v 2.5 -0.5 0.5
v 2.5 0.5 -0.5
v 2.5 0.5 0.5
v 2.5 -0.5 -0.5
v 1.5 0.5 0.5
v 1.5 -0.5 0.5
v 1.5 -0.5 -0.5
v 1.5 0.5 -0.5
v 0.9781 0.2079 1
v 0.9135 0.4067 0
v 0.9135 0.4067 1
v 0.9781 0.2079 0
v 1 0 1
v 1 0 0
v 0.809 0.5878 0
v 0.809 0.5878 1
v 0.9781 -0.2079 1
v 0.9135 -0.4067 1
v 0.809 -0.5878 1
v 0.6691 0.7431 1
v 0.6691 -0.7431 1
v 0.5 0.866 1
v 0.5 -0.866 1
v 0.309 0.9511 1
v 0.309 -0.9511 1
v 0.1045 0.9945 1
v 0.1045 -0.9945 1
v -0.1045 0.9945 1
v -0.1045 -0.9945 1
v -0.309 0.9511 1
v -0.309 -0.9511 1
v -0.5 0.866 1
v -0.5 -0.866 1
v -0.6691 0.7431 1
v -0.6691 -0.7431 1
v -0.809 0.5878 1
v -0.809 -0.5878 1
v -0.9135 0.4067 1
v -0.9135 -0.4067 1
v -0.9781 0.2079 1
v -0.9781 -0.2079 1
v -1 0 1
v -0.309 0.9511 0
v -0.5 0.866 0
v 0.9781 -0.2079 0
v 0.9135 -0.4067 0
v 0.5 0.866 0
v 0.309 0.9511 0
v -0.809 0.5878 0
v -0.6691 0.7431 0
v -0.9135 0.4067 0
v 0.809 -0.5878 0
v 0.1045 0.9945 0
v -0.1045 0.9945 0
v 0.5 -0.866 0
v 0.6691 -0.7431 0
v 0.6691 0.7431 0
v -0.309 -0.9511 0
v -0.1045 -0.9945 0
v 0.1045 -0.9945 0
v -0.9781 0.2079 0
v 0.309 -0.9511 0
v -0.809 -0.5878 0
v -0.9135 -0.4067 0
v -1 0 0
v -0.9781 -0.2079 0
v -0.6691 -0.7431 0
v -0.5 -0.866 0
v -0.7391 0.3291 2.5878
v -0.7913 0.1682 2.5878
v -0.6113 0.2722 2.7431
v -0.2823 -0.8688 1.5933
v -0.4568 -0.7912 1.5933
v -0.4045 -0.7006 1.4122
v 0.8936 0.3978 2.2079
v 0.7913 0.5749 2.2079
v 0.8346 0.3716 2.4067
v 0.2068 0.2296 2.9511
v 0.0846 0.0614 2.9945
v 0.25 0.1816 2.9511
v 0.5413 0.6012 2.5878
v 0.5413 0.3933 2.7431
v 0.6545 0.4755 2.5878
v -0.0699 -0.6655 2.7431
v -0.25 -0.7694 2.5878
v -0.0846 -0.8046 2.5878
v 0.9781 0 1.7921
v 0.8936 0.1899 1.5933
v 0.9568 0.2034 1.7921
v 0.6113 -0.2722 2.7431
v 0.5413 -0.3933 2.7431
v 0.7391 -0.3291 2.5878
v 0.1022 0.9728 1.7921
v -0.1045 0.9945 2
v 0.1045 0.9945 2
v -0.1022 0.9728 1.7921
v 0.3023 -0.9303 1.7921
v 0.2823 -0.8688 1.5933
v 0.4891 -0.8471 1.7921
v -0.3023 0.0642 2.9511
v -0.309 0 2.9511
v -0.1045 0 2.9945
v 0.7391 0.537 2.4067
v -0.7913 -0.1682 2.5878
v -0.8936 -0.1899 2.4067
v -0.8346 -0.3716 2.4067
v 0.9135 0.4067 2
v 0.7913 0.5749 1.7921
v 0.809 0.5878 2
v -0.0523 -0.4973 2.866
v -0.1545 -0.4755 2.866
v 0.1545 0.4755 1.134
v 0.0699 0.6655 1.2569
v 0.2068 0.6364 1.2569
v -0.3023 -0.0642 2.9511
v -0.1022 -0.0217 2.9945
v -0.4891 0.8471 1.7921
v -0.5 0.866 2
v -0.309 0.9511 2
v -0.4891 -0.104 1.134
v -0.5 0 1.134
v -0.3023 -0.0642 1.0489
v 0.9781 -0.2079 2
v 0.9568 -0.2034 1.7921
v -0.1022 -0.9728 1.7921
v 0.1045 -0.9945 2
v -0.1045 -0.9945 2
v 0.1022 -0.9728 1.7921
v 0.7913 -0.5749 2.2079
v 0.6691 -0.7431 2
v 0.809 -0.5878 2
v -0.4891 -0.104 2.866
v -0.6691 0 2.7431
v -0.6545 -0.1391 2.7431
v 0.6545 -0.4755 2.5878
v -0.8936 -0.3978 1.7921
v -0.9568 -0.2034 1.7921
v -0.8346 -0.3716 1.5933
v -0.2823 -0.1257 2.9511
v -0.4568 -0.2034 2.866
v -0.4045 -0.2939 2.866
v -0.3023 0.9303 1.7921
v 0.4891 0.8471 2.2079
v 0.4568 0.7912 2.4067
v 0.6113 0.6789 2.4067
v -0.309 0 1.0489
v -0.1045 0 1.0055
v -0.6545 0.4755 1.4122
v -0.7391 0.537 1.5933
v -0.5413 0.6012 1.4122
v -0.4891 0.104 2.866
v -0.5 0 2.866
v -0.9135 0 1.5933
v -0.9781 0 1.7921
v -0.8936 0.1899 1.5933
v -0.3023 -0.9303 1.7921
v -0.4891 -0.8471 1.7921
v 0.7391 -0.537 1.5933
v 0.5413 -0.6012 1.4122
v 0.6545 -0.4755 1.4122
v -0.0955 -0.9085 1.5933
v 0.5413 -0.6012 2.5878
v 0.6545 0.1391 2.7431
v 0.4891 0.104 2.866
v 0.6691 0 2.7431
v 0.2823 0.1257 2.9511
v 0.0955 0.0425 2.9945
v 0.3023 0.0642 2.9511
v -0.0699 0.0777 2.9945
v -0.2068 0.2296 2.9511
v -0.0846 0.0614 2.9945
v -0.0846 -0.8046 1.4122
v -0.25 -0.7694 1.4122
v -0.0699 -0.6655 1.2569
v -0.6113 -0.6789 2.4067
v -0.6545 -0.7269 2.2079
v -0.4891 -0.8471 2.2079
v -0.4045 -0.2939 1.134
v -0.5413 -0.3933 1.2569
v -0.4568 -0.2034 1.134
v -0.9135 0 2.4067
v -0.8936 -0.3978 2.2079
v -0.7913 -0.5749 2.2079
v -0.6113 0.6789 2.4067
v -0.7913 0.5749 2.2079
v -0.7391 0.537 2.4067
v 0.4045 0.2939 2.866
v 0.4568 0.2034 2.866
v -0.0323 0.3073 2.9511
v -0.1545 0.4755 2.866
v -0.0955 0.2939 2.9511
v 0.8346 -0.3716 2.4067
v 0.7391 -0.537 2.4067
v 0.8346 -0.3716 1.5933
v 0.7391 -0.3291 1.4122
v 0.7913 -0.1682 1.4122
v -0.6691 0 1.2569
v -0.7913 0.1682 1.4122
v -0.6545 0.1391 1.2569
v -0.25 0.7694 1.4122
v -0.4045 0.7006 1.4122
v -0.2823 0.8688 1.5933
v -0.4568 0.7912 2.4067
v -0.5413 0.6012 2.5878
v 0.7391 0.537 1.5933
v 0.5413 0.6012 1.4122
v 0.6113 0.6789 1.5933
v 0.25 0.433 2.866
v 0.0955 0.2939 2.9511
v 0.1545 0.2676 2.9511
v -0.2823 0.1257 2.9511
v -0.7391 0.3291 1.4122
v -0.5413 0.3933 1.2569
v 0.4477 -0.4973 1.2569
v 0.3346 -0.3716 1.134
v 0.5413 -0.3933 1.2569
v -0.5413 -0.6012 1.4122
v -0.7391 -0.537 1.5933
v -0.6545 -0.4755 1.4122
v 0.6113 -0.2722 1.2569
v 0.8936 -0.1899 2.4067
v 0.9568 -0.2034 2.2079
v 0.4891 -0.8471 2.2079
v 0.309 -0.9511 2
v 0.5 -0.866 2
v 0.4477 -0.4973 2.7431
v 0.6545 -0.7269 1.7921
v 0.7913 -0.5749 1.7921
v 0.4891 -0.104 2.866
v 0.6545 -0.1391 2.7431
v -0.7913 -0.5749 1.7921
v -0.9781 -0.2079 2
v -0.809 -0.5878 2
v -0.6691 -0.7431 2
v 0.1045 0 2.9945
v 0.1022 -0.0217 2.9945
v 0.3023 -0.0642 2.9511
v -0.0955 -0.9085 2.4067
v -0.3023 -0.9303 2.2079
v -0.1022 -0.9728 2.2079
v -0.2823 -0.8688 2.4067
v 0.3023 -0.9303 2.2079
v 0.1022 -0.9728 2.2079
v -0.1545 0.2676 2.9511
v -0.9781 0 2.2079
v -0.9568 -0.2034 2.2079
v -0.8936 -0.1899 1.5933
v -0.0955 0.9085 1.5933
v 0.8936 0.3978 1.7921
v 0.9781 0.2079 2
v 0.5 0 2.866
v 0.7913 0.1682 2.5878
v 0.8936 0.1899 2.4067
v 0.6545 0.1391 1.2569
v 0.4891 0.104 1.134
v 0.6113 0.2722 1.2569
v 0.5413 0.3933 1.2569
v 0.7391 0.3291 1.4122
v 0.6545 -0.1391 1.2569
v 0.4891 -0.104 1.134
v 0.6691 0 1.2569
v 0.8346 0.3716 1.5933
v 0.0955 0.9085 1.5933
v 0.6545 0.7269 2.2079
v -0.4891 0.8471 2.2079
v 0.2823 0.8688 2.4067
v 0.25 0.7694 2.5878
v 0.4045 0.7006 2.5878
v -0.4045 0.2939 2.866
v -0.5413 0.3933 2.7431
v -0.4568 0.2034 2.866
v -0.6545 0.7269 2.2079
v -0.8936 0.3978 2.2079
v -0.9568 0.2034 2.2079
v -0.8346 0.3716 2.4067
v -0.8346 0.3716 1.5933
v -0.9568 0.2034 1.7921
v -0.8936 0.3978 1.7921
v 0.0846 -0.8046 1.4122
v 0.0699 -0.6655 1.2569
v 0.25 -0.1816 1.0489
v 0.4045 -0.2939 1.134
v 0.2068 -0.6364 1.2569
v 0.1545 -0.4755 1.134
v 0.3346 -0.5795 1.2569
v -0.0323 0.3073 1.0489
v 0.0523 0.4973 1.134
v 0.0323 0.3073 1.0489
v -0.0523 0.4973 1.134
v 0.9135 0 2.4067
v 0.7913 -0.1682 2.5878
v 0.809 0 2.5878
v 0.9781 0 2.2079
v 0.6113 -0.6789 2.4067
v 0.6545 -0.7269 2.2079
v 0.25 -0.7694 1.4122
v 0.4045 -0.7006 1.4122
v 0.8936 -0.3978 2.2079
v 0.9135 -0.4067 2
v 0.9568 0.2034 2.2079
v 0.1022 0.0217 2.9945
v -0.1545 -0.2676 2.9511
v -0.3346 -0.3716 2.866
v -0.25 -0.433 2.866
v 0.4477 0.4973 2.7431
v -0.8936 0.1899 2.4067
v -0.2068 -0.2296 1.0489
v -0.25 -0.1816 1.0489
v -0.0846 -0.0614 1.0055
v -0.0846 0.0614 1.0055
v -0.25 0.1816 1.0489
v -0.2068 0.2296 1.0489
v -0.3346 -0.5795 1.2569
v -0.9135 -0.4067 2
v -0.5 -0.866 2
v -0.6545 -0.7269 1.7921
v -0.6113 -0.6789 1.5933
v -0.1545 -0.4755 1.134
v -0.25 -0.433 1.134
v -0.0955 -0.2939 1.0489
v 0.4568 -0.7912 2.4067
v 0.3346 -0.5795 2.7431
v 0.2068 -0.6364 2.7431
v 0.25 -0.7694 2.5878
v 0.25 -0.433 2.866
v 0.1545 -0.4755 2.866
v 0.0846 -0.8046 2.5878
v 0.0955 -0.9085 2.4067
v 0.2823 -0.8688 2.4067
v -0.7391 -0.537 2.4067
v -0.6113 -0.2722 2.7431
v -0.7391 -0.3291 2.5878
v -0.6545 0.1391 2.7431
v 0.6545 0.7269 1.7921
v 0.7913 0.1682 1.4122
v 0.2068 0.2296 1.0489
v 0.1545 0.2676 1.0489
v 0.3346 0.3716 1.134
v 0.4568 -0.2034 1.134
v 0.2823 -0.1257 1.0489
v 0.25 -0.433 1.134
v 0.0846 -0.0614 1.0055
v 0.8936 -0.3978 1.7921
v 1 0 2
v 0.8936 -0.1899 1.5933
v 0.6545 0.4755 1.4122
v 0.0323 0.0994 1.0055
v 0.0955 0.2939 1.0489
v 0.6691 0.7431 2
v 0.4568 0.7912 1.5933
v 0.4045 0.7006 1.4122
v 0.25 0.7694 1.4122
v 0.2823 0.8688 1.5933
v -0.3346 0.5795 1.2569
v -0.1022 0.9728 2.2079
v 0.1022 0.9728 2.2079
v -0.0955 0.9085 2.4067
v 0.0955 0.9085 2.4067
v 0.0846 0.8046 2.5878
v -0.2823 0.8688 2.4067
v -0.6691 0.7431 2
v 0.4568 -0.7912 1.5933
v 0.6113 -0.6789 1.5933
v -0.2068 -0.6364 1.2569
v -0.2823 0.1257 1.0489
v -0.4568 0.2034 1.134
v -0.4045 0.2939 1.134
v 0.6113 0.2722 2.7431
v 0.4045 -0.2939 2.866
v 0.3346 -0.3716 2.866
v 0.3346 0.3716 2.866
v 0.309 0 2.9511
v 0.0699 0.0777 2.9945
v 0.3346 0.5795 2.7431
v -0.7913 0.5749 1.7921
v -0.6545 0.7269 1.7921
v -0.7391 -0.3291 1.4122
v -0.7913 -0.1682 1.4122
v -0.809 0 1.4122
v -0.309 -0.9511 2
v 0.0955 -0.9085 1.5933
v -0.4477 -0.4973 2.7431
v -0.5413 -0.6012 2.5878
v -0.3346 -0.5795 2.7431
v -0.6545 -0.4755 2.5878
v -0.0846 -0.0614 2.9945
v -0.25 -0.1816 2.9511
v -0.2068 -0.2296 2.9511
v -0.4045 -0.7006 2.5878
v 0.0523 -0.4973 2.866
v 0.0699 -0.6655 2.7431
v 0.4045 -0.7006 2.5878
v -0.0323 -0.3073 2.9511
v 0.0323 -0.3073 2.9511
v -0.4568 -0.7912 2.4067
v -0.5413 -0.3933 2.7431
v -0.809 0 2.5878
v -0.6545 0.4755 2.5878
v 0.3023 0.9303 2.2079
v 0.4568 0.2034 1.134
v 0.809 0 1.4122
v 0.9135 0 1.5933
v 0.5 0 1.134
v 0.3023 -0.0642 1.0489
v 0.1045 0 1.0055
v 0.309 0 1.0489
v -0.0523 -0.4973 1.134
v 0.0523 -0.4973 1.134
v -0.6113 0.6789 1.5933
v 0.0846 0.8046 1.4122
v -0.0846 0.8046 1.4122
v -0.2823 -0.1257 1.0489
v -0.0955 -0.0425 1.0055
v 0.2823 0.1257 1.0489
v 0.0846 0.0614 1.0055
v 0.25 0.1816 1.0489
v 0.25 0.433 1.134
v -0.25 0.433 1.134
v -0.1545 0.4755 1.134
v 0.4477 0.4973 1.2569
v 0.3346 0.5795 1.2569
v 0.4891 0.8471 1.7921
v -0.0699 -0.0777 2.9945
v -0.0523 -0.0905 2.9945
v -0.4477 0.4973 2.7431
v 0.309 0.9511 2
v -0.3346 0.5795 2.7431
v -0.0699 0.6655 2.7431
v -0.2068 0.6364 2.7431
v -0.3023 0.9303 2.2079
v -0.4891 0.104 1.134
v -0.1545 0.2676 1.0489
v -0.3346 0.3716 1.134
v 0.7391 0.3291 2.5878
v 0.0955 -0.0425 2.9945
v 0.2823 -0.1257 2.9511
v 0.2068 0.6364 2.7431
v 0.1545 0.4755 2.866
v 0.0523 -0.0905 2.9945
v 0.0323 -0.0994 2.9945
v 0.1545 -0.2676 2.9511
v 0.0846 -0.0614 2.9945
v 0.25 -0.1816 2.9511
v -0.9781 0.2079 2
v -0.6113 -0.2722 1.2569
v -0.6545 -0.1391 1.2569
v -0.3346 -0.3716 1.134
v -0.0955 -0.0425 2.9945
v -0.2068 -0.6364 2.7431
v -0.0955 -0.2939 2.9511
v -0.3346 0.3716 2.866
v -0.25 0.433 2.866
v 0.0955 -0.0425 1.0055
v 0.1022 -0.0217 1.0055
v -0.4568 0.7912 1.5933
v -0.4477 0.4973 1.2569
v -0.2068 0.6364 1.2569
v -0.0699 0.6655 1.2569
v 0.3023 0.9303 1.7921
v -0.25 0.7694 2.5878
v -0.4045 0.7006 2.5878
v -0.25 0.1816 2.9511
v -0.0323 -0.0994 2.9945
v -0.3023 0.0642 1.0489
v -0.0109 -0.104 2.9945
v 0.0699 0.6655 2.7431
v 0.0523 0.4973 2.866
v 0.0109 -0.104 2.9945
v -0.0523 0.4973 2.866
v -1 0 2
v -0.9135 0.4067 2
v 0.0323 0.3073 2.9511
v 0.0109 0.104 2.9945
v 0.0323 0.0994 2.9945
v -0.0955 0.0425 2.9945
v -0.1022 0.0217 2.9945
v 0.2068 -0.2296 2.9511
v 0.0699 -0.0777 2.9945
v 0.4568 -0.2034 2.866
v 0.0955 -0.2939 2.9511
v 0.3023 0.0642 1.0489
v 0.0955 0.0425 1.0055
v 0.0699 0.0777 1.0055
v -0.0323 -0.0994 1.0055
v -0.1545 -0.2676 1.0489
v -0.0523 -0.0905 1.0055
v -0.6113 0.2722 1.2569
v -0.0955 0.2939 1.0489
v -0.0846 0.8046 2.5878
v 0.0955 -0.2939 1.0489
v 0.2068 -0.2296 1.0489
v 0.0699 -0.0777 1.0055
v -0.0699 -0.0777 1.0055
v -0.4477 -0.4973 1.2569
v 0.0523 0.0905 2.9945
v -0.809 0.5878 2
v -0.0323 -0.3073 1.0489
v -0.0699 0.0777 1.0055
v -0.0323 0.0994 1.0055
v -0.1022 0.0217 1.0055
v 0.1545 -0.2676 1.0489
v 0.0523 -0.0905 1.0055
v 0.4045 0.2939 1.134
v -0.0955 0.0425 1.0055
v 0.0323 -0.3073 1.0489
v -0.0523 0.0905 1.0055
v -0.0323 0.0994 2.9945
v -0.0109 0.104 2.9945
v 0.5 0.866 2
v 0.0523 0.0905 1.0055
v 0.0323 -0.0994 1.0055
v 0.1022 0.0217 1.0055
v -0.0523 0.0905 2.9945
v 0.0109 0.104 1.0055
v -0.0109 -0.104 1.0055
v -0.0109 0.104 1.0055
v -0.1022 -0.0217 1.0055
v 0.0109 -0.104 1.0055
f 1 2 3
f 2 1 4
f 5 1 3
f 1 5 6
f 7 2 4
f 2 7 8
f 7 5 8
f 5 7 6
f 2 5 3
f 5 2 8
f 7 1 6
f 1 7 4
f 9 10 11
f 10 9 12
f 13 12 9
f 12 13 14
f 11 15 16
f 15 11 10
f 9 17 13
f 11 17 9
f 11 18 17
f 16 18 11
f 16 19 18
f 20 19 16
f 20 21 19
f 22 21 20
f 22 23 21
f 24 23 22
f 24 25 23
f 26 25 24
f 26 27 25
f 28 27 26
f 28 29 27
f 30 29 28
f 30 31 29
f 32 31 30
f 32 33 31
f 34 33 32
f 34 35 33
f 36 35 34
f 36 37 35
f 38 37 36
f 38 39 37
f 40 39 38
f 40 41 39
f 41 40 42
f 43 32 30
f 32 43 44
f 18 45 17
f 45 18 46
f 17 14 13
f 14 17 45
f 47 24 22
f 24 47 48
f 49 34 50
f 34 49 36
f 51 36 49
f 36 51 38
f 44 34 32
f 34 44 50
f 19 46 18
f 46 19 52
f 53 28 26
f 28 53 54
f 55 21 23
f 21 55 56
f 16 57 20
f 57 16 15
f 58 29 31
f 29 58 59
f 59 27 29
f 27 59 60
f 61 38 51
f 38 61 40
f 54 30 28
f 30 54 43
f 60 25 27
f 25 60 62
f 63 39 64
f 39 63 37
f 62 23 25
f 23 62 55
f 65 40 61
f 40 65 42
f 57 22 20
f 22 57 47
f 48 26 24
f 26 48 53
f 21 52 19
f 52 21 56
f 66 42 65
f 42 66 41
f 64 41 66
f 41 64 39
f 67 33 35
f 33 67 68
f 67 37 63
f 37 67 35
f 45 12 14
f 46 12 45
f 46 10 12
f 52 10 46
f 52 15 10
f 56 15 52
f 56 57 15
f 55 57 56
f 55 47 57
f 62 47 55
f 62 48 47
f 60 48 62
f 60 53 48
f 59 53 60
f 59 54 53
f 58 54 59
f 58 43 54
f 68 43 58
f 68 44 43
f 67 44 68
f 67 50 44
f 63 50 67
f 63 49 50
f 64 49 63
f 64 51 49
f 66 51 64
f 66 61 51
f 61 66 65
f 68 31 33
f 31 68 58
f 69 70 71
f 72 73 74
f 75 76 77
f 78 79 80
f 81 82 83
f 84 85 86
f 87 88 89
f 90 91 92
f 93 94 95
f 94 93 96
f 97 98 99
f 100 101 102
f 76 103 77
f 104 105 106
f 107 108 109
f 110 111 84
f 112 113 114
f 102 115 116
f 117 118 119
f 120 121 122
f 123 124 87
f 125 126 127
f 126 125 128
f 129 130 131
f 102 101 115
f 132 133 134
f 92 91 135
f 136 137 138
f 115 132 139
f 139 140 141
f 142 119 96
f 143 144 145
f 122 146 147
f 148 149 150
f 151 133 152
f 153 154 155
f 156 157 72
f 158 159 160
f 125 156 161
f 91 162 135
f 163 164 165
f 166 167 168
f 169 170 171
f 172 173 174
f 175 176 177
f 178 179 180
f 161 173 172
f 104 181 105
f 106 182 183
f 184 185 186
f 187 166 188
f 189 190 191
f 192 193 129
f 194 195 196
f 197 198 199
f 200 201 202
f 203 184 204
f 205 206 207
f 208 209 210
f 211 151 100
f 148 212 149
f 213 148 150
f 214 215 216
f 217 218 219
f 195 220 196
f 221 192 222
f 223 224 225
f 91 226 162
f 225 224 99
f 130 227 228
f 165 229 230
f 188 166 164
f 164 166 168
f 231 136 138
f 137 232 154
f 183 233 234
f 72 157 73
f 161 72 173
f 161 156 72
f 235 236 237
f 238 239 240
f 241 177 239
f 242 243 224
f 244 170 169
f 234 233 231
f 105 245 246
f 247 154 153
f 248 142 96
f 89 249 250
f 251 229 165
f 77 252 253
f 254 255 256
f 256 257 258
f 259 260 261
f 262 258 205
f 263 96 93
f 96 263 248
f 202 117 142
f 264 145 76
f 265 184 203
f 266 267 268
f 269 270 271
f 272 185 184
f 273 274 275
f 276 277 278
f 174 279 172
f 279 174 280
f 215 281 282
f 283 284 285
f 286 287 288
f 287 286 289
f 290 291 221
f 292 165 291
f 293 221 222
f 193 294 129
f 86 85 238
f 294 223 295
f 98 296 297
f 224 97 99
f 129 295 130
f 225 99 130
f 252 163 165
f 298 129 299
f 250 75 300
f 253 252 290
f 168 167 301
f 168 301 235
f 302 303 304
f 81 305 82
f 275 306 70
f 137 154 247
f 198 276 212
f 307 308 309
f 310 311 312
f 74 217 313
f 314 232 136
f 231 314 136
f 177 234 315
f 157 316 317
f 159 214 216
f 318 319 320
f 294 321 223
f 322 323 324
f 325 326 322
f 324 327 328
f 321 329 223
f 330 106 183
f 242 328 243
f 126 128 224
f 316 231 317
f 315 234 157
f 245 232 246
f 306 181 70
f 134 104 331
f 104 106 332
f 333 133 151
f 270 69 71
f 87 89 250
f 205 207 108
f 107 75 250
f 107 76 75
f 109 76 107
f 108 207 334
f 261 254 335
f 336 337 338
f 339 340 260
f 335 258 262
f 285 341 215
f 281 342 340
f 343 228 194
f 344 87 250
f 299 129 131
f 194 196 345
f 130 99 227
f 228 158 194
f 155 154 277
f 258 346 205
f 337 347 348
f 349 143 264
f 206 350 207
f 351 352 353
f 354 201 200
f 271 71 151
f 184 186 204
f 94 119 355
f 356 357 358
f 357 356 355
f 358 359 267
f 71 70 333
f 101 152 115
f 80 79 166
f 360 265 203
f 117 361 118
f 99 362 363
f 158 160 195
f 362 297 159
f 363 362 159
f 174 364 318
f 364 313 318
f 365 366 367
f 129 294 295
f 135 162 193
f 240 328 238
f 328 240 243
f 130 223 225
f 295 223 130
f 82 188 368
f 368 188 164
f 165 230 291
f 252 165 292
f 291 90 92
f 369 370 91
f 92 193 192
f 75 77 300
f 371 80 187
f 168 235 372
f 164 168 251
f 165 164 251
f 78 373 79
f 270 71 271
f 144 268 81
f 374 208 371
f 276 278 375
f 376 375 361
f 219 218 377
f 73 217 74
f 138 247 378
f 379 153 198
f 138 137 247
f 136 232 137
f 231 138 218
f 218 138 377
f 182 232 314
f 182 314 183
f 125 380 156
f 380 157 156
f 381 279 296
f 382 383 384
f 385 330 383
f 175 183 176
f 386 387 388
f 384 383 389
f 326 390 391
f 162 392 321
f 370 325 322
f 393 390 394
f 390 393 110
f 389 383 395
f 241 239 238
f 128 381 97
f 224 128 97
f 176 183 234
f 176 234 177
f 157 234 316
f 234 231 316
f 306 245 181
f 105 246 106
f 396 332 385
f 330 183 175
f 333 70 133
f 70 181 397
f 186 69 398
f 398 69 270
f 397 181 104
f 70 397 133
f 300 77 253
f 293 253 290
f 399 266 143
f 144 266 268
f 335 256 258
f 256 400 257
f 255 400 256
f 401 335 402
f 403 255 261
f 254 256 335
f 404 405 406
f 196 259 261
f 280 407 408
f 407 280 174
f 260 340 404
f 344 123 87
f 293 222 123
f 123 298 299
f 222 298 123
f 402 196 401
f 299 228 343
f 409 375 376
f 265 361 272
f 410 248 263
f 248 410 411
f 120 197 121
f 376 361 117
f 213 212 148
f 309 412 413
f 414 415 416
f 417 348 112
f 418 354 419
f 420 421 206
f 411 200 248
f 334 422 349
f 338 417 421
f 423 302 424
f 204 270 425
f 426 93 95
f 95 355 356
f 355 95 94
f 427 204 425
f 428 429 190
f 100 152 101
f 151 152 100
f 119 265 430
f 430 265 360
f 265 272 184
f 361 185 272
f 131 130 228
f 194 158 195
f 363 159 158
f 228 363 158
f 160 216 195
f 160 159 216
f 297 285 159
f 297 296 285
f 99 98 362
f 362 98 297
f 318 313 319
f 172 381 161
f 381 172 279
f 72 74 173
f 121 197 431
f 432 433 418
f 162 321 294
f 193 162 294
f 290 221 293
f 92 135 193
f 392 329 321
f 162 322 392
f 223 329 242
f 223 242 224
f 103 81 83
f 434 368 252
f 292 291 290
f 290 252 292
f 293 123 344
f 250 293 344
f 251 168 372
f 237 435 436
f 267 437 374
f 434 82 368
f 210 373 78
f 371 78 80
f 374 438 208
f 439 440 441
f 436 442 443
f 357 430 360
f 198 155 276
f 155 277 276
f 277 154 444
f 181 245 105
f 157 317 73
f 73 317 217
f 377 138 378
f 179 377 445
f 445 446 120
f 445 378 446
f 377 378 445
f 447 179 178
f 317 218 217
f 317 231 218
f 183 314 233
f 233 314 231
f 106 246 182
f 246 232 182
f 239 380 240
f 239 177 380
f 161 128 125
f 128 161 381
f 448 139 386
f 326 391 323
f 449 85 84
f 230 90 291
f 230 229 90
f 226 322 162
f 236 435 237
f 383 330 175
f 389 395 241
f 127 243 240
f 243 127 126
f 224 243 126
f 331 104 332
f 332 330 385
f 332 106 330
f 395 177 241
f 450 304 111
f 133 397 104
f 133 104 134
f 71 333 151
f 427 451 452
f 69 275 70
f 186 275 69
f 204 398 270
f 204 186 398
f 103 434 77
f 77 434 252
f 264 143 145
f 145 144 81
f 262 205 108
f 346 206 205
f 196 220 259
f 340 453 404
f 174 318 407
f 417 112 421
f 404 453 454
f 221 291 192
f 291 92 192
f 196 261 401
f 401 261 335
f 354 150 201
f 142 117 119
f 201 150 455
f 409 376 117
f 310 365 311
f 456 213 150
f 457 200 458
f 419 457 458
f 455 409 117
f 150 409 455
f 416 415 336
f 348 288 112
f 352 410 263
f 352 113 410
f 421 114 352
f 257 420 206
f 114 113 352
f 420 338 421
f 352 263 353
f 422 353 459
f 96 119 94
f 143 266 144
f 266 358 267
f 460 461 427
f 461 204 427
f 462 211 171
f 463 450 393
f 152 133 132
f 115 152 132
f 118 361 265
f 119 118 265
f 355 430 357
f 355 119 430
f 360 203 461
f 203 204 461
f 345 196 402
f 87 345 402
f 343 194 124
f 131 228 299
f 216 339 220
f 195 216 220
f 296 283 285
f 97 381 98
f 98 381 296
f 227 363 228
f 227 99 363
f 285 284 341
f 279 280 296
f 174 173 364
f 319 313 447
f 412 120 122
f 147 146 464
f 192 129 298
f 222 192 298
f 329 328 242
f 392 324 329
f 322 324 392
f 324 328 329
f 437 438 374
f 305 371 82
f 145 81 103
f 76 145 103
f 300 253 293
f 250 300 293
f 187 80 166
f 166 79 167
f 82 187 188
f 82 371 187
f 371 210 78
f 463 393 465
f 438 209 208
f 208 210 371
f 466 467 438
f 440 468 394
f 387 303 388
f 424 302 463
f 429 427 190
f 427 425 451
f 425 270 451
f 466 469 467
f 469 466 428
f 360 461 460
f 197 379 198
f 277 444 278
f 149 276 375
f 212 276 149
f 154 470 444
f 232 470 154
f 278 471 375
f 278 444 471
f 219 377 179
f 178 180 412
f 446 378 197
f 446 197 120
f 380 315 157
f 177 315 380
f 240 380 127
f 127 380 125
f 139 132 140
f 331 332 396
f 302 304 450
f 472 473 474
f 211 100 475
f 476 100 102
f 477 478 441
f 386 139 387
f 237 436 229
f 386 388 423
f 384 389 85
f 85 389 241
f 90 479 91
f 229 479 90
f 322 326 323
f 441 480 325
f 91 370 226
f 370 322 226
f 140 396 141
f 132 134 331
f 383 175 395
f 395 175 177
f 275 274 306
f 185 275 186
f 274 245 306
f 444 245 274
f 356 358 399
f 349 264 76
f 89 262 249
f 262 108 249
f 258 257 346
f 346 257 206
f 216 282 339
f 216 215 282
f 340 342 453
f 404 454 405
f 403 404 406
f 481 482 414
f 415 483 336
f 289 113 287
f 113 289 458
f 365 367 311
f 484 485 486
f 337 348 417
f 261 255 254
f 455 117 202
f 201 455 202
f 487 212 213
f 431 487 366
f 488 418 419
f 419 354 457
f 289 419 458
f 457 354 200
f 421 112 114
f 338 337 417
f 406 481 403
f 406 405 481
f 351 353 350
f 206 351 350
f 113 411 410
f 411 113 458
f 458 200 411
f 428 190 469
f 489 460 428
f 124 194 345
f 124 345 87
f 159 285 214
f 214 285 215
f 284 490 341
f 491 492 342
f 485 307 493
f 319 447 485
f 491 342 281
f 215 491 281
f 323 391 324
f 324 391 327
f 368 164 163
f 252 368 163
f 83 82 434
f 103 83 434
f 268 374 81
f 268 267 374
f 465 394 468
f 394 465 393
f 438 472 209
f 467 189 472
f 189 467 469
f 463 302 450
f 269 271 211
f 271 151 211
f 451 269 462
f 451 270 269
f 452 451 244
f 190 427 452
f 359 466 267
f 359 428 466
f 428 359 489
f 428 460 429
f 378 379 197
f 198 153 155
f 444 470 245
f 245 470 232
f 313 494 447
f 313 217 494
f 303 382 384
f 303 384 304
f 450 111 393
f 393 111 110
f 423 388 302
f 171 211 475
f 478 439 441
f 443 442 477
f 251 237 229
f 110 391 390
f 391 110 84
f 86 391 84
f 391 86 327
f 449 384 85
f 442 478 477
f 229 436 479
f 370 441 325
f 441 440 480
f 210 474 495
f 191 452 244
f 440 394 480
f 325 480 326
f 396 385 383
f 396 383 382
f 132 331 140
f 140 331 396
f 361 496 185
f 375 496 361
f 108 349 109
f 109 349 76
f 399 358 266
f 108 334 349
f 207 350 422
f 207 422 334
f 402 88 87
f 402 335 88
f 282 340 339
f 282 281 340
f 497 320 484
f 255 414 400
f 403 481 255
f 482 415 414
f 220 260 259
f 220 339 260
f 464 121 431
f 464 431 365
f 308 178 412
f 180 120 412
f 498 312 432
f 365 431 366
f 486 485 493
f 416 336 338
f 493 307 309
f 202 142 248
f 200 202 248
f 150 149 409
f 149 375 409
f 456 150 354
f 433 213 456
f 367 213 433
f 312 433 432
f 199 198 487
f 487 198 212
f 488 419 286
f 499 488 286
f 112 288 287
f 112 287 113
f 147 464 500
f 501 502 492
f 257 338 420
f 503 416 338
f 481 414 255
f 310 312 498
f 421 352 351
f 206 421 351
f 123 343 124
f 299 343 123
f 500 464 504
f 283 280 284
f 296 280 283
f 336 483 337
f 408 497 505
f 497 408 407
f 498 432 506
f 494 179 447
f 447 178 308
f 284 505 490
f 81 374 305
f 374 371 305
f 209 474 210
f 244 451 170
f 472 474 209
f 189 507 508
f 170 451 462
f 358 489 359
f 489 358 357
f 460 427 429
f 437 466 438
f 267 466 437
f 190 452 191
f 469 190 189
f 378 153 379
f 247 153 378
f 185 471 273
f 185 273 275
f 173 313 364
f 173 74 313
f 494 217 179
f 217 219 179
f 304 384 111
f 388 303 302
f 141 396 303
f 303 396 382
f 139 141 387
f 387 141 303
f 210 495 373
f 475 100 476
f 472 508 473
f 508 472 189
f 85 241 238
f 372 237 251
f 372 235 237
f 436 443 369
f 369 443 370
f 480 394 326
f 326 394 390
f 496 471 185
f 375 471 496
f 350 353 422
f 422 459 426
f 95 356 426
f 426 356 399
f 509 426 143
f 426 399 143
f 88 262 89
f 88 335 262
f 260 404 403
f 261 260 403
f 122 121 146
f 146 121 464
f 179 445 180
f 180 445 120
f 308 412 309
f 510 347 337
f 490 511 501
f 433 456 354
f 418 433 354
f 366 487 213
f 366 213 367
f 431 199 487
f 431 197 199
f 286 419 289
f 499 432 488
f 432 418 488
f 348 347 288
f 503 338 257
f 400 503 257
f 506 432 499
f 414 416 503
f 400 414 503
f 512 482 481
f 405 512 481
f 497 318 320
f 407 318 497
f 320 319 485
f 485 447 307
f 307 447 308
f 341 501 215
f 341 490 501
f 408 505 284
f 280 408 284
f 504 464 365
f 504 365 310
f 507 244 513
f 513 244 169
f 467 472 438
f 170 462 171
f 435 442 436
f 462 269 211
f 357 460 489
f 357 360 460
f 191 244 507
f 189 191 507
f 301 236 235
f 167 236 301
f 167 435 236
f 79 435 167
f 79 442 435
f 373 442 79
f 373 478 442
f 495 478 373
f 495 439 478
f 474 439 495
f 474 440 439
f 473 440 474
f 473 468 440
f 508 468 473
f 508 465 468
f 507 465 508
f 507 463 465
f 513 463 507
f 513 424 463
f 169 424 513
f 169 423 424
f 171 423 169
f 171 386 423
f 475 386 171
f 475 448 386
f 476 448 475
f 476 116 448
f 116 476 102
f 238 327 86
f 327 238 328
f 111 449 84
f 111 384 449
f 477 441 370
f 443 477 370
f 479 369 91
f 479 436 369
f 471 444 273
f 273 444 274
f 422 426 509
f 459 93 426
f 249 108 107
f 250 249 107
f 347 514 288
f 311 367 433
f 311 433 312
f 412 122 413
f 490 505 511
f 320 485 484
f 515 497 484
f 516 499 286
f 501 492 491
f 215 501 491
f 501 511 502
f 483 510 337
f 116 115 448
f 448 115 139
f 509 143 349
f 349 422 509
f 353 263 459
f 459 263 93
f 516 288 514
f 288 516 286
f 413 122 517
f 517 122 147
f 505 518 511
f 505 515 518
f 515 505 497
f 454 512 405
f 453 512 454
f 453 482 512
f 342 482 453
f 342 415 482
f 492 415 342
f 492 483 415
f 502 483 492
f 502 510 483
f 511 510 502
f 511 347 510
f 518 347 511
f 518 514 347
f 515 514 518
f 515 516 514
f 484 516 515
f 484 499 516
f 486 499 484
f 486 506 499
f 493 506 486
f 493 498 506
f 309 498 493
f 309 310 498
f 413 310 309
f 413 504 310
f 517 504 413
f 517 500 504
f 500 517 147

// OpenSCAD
$fn = 30;

dist = 2;

translate([dist, 0, 0]){
cube(center=true);
}

translate([0,0,0]){
cylinder();
}

translate([0,0,dist]){
    sphere();
}
